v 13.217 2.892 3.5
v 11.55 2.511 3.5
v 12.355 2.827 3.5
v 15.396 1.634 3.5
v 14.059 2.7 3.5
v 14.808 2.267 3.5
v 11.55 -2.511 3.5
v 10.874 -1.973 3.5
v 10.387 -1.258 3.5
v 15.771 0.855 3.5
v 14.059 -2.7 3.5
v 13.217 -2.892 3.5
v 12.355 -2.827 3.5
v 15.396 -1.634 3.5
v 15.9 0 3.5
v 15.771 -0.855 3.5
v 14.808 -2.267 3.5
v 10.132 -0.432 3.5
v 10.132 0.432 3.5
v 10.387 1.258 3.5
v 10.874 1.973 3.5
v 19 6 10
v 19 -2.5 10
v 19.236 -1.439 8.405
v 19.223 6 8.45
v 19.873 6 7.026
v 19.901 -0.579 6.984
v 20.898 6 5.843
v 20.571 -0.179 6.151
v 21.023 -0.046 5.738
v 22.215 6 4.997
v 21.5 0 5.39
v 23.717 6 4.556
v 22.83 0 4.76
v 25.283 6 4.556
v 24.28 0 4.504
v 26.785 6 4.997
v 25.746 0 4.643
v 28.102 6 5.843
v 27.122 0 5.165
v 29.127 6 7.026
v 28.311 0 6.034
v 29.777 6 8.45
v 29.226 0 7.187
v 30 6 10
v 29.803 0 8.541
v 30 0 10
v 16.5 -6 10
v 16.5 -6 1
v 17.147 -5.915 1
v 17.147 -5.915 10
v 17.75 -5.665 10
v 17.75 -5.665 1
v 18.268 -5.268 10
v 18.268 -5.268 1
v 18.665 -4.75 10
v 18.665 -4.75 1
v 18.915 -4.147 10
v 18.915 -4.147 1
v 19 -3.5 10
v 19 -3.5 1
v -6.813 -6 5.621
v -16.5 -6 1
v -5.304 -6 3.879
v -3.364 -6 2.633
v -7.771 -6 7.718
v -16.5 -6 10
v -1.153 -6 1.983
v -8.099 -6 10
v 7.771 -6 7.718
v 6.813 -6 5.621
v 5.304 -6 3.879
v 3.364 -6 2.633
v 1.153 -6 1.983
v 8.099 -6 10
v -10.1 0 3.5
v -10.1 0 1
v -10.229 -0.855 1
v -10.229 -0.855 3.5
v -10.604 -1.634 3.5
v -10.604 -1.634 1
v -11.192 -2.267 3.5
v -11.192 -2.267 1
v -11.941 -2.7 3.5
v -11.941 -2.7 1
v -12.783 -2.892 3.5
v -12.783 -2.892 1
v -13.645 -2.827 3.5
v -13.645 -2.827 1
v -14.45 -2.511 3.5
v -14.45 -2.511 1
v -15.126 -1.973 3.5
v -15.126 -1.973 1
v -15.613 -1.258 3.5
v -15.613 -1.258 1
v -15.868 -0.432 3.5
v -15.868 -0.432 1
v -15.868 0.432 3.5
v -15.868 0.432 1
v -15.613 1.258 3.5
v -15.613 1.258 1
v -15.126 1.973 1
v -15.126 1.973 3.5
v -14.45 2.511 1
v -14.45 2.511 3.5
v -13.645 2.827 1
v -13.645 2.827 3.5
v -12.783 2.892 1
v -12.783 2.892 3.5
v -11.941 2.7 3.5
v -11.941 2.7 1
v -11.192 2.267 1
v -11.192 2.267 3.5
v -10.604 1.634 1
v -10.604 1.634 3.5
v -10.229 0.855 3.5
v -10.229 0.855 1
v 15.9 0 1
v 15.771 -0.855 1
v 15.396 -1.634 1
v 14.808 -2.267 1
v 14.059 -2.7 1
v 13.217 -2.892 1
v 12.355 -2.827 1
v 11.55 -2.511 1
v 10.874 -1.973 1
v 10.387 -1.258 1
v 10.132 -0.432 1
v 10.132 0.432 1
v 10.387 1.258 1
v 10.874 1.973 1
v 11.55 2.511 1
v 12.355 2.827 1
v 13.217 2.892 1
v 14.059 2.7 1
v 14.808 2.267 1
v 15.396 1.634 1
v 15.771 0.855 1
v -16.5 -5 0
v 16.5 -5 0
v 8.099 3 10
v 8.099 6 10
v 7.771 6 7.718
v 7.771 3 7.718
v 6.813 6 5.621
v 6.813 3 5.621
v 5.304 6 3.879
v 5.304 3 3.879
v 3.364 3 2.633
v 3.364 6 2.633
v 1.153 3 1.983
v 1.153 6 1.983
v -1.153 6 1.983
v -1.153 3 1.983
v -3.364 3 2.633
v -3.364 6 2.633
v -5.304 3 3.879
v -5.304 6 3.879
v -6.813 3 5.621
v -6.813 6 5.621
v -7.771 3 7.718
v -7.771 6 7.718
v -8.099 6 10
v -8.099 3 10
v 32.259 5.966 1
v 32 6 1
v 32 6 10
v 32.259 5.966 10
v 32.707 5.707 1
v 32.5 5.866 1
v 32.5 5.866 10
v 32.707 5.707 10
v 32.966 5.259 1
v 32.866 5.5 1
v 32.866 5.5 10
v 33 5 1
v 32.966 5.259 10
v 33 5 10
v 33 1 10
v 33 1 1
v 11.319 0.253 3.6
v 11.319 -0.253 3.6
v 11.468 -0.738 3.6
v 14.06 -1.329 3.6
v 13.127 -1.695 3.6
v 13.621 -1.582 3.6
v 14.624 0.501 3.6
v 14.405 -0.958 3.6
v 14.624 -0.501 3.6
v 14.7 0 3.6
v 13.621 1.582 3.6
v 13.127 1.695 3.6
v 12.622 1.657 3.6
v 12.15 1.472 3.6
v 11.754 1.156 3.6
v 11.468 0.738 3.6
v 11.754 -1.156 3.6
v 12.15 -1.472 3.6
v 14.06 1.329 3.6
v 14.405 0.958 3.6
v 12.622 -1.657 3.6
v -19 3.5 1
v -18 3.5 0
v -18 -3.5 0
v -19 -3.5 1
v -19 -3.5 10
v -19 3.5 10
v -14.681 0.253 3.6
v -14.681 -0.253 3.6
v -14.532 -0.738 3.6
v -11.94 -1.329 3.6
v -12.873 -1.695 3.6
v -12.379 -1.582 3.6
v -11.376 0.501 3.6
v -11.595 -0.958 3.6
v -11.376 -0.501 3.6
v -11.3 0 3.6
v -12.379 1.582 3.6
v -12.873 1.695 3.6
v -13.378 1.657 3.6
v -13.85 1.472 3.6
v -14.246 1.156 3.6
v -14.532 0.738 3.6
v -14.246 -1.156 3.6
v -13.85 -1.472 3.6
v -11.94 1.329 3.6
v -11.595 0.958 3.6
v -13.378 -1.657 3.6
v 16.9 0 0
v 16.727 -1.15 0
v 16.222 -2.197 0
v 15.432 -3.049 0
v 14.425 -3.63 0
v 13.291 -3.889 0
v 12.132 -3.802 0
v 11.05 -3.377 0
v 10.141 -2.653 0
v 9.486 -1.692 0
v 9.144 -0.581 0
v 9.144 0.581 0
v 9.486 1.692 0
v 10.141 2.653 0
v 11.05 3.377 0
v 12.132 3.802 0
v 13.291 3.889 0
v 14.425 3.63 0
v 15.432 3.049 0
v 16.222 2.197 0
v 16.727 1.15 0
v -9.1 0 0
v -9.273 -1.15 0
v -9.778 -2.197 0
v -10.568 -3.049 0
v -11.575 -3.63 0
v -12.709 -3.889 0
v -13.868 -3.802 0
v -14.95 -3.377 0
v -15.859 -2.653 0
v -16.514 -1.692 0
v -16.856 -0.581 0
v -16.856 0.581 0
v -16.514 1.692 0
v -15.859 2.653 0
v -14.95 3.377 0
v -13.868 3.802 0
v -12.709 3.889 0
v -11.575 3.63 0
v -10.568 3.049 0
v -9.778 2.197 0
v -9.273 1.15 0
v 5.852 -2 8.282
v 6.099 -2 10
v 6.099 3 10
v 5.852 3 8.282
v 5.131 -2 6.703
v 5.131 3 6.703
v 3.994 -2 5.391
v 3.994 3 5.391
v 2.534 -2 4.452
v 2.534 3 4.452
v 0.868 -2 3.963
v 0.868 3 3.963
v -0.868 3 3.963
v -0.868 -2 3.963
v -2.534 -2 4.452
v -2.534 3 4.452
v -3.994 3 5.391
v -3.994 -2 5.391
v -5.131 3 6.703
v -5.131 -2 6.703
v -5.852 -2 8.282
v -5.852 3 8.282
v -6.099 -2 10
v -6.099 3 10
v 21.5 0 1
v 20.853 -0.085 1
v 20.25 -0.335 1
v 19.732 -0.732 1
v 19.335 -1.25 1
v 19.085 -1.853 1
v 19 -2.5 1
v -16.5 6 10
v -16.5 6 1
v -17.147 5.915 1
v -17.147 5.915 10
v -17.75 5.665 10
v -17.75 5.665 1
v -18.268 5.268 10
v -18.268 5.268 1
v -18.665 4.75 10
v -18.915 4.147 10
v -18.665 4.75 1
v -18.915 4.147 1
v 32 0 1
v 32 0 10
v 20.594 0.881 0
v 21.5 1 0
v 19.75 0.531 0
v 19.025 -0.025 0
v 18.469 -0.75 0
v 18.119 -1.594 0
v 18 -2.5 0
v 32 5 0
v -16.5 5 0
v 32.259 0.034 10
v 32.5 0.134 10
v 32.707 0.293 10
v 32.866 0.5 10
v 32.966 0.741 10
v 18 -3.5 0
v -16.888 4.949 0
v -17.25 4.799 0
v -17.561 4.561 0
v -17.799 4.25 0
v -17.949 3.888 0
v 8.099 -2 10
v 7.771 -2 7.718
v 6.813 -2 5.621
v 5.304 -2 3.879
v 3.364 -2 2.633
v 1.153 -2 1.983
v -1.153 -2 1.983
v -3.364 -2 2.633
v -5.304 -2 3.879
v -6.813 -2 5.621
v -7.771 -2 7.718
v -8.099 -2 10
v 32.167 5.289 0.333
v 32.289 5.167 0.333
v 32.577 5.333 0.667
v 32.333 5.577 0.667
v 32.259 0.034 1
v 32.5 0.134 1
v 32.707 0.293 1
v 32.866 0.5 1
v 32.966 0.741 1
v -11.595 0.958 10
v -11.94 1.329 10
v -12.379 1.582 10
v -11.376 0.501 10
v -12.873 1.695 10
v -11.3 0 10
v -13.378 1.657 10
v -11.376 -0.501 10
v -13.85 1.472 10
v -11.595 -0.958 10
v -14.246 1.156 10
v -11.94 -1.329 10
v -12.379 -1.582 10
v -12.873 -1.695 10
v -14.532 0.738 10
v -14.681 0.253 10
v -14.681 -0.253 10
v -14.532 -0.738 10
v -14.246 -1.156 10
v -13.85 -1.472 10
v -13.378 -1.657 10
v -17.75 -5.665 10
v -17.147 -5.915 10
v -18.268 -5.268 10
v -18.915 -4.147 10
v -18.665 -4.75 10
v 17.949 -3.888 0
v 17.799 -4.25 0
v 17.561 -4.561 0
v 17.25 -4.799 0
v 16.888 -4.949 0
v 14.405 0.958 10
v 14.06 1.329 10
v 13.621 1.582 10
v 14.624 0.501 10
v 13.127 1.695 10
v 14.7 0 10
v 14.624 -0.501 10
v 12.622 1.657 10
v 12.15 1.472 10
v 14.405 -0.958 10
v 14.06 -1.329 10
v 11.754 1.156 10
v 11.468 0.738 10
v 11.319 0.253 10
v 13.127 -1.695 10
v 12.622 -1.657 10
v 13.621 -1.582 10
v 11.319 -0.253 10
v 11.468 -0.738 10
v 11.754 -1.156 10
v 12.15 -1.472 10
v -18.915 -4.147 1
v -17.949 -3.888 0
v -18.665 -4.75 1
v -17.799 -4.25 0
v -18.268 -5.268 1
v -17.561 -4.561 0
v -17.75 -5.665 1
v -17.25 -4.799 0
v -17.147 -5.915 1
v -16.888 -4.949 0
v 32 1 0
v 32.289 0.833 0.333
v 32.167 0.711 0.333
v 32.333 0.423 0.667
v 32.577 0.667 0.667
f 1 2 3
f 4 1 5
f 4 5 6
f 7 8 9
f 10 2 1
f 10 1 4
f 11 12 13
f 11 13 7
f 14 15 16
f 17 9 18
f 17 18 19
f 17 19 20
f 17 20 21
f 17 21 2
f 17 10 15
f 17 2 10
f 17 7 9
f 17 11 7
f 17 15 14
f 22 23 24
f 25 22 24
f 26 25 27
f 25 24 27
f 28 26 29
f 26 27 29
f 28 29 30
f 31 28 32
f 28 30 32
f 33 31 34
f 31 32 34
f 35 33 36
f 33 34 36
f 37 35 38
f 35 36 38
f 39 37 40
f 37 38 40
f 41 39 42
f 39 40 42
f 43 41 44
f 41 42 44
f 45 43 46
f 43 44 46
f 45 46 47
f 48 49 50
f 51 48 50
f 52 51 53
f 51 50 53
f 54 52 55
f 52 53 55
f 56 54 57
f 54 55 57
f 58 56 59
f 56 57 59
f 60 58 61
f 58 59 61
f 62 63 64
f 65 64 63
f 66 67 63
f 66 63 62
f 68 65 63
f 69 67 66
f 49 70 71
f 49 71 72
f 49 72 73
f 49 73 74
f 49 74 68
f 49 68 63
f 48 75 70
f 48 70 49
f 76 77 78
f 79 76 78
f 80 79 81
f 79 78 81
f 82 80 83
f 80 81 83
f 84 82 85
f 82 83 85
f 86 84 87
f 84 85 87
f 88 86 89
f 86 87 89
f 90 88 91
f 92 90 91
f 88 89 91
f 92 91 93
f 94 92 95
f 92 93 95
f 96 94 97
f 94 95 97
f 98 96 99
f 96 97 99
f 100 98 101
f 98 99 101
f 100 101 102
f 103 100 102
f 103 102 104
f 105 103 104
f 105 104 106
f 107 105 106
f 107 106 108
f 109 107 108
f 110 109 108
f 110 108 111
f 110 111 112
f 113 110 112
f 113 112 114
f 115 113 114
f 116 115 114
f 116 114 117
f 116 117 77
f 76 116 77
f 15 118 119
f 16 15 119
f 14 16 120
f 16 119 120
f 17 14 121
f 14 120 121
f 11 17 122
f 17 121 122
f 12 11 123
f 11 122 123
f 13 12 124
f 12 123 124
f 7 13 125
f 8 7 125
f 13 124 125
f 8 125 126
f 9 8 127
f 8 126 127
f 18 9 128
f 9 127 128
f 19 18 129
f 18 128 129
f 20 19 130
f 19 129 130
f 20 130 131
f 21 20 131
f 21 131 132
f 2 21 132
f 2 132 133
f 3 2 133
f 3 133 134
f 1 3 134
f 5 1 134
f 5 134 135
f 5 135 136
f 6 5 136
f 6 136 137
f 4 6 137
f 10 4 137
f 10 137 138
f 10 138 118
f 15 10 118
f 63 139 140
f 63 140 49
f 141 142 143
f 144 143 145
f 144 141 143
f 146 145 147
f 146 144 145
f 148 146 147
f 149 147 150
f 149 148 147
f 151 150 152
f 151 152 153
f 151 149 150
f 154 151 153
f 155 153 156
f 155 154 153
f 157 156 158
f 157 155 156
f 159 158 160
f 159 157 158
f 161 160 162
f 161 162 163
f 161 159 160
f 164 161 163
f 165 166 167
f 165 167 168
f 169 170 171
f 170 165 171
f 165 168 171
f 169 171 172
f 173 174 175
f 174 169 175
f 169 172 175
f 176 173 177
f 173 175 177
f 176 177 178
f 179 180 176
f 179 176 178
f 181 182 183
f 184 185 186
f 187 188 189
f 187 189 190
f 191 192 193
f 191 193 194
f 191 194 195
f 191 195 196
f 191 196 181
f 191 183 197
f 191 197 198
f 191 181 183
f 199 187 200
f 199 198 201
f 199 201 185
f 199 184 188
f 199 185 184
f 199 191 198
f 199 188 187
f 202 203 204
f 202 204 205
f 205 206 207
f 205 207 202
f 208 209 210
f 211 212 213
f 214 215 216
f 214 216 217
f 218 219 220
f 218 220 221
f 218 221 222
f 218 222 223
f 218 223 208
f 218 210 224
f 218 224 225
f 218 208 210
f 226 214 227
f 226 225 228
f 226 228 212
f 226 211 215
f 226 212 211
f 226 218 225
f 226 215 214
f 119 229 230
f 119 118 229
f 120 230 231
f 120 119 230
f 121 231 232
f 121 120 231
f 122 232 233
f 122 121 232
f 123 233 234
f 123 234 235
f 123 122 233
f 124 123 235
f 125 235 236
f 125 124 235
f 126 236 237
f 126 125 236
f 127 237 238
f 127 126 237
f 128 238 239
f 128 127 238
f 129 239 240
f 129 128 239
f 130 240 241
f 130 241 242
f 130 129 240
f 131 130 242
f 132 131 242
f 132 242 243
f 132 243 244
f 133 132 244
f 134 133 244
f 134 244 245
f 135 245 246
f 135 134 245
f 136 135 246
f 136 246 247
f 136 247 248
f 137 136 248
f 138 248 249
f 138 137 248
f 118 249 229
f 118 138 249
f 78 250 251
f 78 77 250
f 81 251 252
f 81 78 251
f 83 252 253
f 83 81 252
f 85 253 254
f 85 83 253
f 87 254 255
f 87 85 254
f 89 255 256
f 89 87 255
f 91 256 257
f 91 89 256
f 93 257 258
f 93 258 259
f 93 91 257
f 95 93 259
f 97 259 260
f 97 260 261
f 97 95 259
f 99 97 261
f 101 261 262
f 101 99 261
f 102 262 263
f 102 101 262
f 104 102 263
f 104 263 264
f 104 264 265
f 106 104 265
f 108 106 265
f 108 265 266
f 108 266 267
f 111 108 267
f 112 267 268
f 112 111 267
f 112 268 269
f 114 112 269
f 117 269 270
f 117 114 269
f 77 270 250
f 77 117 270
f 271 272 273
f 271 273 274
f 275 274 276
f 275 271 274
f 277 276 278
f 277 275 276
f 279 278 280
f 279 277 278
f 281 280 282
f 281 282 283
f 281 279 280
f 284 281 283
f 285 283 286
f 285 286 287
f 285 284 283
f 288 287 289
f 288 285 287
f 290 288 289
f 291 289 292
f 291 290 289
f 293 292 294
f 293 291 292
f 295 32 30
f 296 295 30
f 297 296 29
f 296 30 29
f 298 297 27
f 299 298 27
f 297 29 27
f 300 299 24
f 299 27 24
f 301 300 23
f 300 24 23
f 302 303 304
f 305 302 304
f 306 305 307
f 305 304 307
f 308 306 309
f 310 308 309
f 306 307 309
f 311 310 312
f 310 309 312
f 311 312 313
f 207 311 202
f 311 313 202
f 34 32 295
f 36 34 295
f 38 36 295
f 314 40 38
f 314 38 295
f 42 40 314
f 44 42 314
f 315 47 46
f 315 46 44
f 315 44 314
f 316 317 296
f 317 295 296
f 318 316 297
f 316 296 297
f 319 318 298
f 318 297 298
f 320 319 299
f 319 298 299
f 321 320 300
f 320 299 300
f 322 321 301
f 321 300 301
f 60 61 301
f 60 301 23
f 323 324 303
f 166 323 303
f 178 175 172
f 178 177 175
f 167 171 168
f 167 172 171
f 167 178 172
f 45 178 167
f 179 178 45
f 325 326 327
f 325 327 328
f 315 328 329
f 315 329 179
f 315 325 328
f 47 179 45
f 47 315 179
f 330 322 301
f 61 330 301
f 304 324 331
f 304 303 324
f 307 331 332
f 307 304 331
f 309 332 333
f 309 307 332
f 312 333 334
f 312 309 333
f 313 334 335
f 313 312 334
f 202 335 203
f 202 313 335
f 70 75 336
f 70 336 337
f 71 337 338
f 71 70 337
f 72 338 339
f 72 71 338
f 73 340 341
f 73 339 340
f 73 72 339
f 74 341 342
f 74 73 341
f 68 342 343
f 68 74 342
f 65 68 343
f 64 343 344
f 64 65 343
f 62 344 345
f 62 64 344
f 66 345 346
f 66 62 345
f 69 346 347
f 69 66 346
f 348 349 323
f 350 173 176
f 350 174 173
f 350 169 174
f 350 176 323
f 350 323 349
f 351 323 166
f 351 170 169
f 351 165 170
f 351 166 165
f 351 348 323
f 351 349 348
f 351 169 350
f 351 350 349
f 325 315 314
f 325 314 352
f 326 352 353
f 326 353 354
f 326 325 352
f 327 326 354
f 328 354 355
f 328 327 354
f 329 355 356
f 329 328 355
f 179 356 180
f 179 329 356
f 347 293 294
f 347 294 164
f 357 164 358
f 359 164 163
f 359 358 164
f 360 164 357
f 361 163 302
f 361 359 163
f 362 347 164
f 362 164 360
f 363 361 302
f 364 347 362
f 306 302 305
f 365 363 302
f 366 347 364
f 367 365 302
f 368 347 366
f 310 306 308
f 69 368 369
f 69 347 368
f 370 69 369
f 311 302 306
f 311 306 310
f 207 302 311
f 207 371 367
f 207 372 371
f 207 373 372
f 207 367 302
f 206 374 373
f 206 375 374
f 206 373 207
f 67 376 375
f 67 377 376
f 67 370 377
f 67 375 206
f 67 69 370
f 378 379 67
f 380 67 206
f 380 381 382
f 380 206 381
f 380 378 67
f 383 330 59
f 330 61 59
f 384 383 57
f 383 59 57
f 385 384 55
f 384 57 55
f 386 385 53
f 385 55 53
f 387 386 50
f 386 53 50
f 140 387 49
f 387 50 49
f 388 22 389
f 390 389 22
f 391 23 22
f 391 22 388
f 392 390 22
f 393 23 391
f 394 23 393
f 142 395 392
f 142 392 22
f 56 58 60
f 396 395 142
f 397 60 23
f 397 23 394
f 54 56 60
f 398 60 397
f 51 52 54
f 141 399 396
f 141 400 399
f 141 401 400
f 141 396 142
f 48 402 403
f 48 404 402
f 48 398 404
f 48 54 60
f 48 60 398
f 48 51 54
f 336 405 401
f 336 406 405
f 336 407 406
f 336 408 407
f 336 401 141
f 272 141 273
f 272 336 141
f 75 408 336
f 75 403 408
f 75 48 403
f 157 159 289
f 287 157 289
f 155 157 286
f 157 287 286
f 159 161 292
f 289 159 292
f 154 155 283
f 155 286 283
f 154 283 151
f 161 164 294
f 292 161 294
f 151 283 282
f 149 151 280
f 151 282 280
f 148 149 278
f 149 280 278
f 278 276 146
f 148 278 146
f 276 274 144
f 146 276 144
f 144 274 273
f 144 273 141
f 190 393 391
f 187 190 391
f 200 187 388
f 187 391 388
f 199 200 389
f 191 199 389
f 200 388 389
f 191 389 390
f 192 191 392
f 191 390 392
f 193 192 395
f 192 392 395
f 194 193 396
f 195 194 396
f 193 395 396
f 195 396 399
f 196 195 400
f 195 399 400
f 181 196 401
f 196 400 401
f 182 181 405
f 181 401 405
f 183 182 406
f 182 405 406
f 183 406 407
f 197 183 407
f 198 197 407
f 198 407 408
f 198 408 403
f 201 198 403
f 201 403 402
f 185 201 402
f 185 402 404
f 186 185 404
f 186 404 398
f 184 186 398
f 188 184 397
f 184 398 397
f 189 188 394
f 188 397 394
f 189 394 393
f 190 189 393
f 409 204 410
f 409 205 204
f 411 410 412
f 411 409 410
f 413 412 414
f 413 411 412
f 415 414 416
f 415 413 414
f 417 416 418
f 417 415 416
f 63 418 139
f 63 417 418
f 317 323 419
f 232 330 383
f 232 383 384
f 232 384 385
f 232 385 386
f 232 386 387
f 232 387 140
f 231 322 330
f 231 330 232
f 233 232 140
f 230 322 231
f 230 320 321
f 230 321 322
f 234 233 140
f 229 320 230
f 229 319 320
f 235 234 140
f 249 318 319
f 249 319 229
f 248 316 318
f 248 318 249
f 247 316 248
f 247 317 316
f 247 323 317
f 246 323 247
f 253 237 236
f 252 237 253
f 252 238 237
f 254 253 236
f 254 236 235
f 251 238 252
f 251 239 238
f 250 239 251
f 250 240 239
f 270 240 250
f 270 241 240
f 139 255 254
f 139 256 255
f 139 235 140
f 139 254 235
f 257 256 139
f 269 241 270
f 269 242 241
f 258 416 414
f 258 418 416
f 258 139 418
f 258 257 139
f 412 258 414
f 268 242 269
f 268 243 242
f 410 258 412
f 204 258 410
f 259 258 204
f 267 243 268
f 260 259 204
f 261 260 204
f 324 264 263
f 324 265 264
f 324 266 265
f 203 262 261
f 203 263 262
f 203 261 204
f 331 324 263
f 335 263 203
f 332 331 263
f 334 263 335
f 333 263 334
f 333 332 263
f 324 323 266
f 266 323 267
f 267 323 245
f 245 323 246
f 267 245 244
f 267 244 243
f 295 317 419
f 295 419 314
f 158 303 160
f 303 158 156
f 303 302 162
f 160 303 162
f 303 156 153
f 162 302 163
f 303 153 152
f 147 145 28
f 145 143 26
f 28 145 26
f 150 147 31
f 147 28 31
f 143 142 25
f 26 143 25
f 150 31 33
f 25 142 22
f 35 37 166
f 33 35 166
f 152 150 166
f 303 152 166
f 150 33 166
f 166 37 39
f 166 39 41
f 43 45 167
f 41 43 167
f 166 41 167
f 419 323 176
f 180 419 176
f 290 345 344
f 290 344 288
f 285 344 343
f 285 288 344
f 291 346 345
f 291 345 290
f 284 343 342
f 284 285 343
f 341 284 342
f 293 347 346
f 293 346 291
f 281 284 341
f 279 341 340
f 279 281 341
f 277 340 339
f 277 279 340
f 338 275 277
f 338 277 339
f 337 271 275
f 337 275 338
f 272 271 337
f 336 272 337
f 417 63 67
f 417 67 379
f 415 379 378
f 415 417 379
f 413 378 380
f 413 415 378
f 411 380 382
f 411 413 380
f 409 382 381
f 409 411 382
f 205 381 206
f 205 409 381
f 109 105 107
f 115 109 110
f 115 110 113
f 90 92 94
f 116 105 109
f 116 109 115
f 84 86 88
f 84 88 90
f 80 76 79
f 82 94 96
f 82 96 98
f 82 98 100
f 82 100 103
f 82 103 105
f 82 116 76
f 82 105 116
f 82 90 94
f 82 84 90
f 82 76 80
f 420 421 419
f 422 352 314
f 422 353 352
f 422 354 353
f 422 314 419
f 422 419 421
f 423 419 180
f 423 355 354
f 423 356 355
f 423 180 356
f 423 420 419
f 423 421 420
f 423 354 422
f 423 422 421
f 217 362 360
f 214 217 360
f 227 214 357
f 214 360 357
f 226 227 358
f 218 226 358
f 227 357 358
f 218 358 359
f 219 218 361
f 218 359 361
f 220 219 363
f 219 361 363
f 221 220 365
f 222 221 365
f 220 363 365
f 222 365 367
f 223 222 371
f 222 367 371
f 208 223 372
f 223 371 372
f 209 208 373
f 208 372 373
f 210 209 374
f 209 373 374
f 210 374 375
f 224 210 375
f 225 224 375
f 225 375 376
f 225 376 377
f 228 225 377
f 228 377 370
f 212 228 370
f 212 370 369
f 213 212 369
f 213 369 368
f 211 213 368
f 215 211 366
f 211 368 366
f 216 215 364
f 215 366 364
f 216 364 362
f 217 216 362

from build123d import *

# Parameters (mm, degrees)
F1_DEPTH      = 6
F2_DEPTH      = 2
F2_DEPTH_BACK = 3
F3_DEPTH      = 6
F4_R          = 2.9
F4_R_2        = 1.7
F5_DEPTH      = 3.5
F6_R          = 2.5
F7_T4_DEPTH   = 10
F7_S5_R       = 5.5
F7_T6_DEPTH   = 7
F7_T7_DEPTH   = 22.5
F8_R          = 1
F9_T1_DEPTH   = 48.4999999995
F9_T3_DEPTH   = 10.5
F9_T5_DEPTH   = 4
F9_T7_DEPTH   = 1
F9_T9_DEPTH   = 32.9999999994
F9_T11_DEPTH  = 7
F9_T18_ANGLE  = 90
F9_T20_ANGLE  = 89.9999999974
F9_T22_ANGLE  = 90
F9_T24_ANGLE  = 90.0000000053
F9_T26_ANGLE  = 90
F9_T28_ANGLE  = 90
F10_R         = 1.7
F11_DEPTH     = 6.4


# Not quite as in the source:
# - a fillet or chamfer that OpenCascade refuses, or shapes differently, is made with other operations: its cross-section is extruded or revolved along the edge and cut away or added


with BuildPart() as f1:
    # F0 (on Front) → F1 (new body, symmetric)
    with BuildSketch(Plane.XZ):
        with BuildLine():
            Line((18.9999999997, 0), (18.9999999997, 10))
            Line((18.9999999997, 10), (8.099, 10))
            ThreePointArc((8.099, 10), (0, 1.901), (-8.099, 10))
            Line((-8.099, 10), (-18.9999999997, 10))
            Line((-18.9999999997, 10), (-18.9999999997, 0))
            Line((-18.9999999997, 0), (18.9999999997, 0))
        make_face()
    extrude(amount=F1_DEPTH, both=True)

    # F0 (on Front) → F2 (join, two sides)
    with BuildSketch(Plane.XZ) as f2_sk:
        with BuildLine():
            ThreePointArc((-8.099, 10), (0, 1.901), (8.099, 10))
            Line((8.099, 10), (6.099, 10))
            ThreePointArc((6.099, 10), (0, 3.901), (-6.099, 10))
            Line((-6.099, 10), (-8.099, 10))
        make_face()
    extrude(amount=F2_DEPTH)
    extrude(f2_sk.sketch, amount=-F2_DEPTH_BACK)

    # F0 (on Front) → F3 (join)
    with BuildSketch(Plane.XZ):
        with BuildLine():
            ThreePointArc((29.9999999997, 10), (24.4999999997, 4.5), (18.9999999997, 10))
            Line((18.9999999997, 10), (18.9999999997, 0))
            Line((18.9999999997, 0), (32.9999999997, 0))
            Line((32.9999999997, 0), (32.9999999997, 10))
            Line((32.9999999997, 10), (29.9999999997, 10))
        make_face()
    extrude(amount=-F3_DEPTH)

    # F4 (on face) → F5 (cut)
    with BuildSketch(Plane(origin=(0, 0, 0), x_dir=(1, 0, 0), z_dir=(0, 0, -1))):
        with Locations((13, 0)):
            Circle(F4_R)
        with Locations((13, 0)):
            Circle(F4_R_2, mode=Mode.SUBTRACT)
        with Locations((-13, 0)):
            Circle(F4_R)
        with Locations((-13, 0)):
            Circle(F4_R_2, mode=Mode.SUBTRACT)
        with Locations((13, 0)):
            Circle(F4_R_2)
        with Locations((-13, 0)):
            Circle(F4_R_2)
    extrude(amount=-F5_DEPTH, mode=Mode.SUBTRACT)

    # F6
    f6_edges = [f1.edges().sort_by_distance(p)[0] for p in [
        (-19, 6, 5),
        (-19, -6, 5),
    ]]
    fillet(f6_edges, radius=F6_R)

    # F7: fillet of radius 2.5 on 2 edges, made by hand


with BuildPart() as f7_tool2:
    # F7_s3 → F7_t4 (new body)
    with BuildSketch(Plane.XY.offset(10)):
        with BuildLine():
            ThreePointArc((21.4999999997, 0), (19.7322330468, -0.732233047), (18.9999999997, -2.5))
            Line((18.9999999997, -2.5), (18.9999999997, 0))
            Line((18.9999999997, 0), (21.4999999997, 0))
        make_face()
    extrude(amount=-F7_T4_DEPTH)

    # F7_s5 → F7_t6 (cut, symmetric)
    with BuildSketch(Plane.XZ.offset(1.2)):
        with Locations((24.4999999997, 10)):
            Circle(F7_S5_R)
    extrude(amount=F7_T6_DEPTH, both=True, mode=Mode.SUBTRACT)


with BuildPart() as f1_1:
    add(f1.part)

    # F7_t1: union F7_tool2
    add(f7_tool2.part)

    # F7_s8 → F7_t7 (cut)
    with BuildSketch(Plane.XY.offset(-6.25)):
        with BuildLine():
            ThreePointArc((16.4999999997, -6), (18.2677669527, -5.267766953), (18.9999999997, -3.5))
            Line((18.9999999997, -3.5), (18.9999999997, -6))
            Line((18.9999999997, -6), (16.4999999997, -6))
        make_face()
    extrude(amount=F7_T7_DEPTH, mode=Mode.SUBTRACT)

    # F8
    f8_edges = [f1_1.edges().sort_by_distance(p)[0] for p in [
        (33, 6, 5),
        (33, 0, 5),
    ]]
    fillet(f8_edges, radius=F8_R)

    # F9: chamfer of 1 on 14 edges, made by hand

    # F9_s2 → F9_t1 (cut)
    with BuildSketch(Plane.YZ.offset(-16.4999999997)):
        Polygon((5, 0), (6, 1), (6, 0), align=None)
    extrude(amount=F9_T1_DEPTH, mode=Mode.SUBTRACT)

    # F9_s4 → F9_t3 (cut)
    with BuildSketch(Plane.YZ.offset(21.4999999997)):
        Polygon((1, 0), (0, 1), (0, 0), align=None)
    extrude(amount=F9_T3_DEPTH, mode=Mode.SUBTRACT)

    # F9_s6 → F9_t5 (cut)
    with BuildSketch(Plane.XZ.offset(-5)):
        Polygon((31.9999999997, 0), (32.9999999997, 1), (32.9999999997, 0), align=None)
    extrude(amount=F9_T5_DEPTH, mode=Mode.SUBTRACT)

    # F9_s8 → F9_t7 (cut)
    with BuildSketch(Plane.XZ.offset(2.5)):
        Polygon((17.9999999997, 0), (18.9999999997, 1), (18.9999999997, 0), align=None)
    extrude(amount=F9_T7_DEPTH, mode=Mode.SUBTRACT)

    # F9_s10 → F9_t9 (cut)
    with BuildSketch(Plane.YZ.offset(-16.4999999997)):
        Polygon((-5, 0), (-6, 1), (-6, 0), align=None)
    extrude(amount=F9_T9_DEPTH, mode=Mode.SUBTRACT)

    # F9_s12 → F9_t11 (cut)
    with BuildSketch(Plane.XZ.offset(-3.5)):
        Polygon((-17.9999999997, 0), (-18.9999999997, 1), (-18.9999999997, 0), align=None)
    extrude(amount=F9_T11_DEPTH, mode=Mode.SUBTRACT)

    # F9_s13 → F9_t14 (revolve, cut)
    with BuildSketch(Plane.XZ):
        Polygon((-9.1, 0), (-10.1, 1), (-10.1, 0), align=None)
    revolve(axis=Axis((-13, 0, 0), (0, 0, -1)), mode=Mode.SUBTRACT)

    # F9_s15 → F9_t16 (revolve, cut)
    with BuildSketch(Plane.XZ):
        Polygon((16.9, 0), (15.9, 1), (15.9, 0), align=None)
    revolve(axis=Axis((13, 0, 0), (0, 0, -1)), mode=Mode.SUBTRACT)

    # F9_s17 → F9_t18 (revolve, cut)
    with BuildSketch(Plane.YZ.offset(31.9999999997)):
        Polygon((1, 0), (0, 1), (0, 0), align=None)
    revolve(axis=Axis((31.9999999997, 1, 0), (0, 0, 1)), revolution_arc=F9_T18_ANGLE, mode=Mode.SUBTRACT)

    # F9_s19 → F9_t20 (revolve, cut)
    with BuildSketch(Plane.YZ.offset(21.4999999998)):
        Polygon((1, 0), (0, 1), (0, 0), align=None)
    revolve(axis=Axis((21.4999999998, -2.5000000001, 0), (0, 0, 1)), revolution_arc=F9_T20_ANGLE, mode=Mode.SUBTRACT)

    # F9_s21 → F9_t22 (revolve, cut)
    with BuildSketch(Plane.XZ.offset(-5)):
        Polygon((31.9999999997, 0), (32.9999999997, 1), (32.9999999997, 0), align=None)
    revolve(axis=Axis((31.9999999997, 5, 0), (0, 0, 1)), revolution_arc=F9_T22_ANGLE, mode=Mode.SUBTRACT)

    # F9_s23 → F9_t24 (revolve, cut)
    with BuildSketch(Plane.XZ.offset(3.5000000001)):
        Polygon((17.9999999997, 0), (18.9999999997, 1), (18.9999999997, 0), align=None)
    revolve(axis=Axis((16.4999999998, -3.5000000001, 0), (0, 0, -1)), revolution_arc=F9_T24_ANGLE, mode=Mode.SUBTRACT)

    # F9_s25 → F9_t26 (revolve, cut)
    with BuildSketch(Plane.YZ.offset(-16.4999999997)):
        Polygon((5, 0), (6, 1), (6, 0), align=None)
    revolve(axis=Axis((-16.4999999997, 3.5, 0), (0, 0, 1)), revolution_arc=F9_T26_ANGLE, mode=Mode.SUBTRACT)

    # F9_s27 → F9_t28 (revolve, cut)
    with BuildSketch(Plane.XZ.offset(3.5)):
        Polygon((-17.9999999997, 0), (-18.9999999997, 1), (-18.9999999997, 0), align=None)
    revolve(axis=Axis((-16.4999999997, -3.5, 0), (0, 0, 1)), revolution_arc=F9_T28_ANGLE, mode=Mode.SUBTRACT)

    # F10 (on face) → F11 (cut)
    with BuildSketch(Plane.XY.offset(10)):
        with Locations((-13, 0)):
            Circle(F10_R)
        with Locations((13, 0)):
            Circle(F10_R)
    extrude(amount=-F11_DEPTH, mode=Mode.SUBTRACT)


solid = f1_1.part
